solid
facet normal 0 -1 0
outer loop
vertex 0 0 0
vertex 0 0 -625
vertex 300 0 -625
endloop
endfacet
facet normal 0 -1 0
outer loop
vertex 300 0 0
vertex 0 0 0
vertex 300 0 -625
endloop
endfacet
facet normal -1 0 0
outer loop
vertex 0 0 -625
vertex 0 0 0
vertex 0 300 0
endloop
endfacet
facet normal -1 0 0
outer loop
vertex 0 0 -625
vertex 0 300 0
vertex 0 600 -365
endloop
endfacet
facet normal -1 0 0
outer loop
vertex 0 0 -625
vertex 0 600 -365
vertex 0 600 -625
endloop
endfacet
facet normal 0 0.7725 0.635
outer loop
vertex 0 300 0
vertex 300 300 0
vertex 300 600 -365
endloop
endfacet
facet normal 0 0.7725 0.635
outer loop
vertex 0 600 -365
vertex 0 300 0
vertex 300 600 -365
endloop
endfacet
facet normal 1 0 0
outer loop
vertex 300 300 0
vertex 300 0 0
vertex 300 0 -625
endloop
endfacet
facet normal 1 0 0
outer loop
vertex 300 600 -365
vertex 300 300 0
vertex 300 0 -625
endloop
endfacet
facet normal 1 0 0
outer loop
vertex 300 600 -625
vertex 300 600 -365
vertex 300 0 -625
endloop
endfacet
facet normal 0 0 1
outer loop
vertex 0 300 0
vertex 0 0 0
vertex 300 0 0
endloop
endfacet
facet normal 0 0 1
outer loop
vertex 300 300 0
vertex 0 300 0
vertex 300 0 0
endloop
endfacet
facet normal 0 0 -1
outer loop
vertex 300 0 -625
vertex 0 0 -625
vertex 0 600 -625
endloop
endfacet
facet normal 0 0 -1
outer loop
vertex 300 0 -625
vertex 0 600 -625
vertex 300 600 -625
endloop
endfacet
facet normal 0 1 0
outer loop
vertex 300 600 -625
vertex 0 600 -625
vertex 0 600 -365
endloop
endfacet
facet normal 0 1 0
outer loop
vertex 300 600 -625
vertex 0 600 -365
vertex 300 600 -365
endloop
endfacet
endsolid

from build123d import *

# Parameters (mm, degrees)
SKETCH_1_W          = 300
SKETCH_1_H          = 625
EXTRUDE_1_DEPTH     = 600
CUT_EXTRUDE_1_DEPTH = 600


with BuildPart() as part:
    # 草图1 → 凸台-拉伸1 (new body)
    with BuildSketch(Plane(origin=(0, 0, 0), x_dir=(1, 0, 0), z_dir=(0, 1, 0))):
        with Locations((150, 312.5)):
            Rectangle(SKETCH_1_W, SKETCH_1_H)
    extrude(amount=EXTRUDE_1_DEPTH)

    # 草图2 → 切除-拉伸1 (cut)
    with BuildSketch(Plane(origin=(300, 0, 0), x_dir=(0, 0, -1), z_dir=(1, 0, 0))):
        Polygon((365, 600), (0, 600), (0, 300), align=None)
    extrude(amount=-CUT_EXTRUDE_1_DEPTH, mode=Mode.SUBTRACT)


solid = part.part
